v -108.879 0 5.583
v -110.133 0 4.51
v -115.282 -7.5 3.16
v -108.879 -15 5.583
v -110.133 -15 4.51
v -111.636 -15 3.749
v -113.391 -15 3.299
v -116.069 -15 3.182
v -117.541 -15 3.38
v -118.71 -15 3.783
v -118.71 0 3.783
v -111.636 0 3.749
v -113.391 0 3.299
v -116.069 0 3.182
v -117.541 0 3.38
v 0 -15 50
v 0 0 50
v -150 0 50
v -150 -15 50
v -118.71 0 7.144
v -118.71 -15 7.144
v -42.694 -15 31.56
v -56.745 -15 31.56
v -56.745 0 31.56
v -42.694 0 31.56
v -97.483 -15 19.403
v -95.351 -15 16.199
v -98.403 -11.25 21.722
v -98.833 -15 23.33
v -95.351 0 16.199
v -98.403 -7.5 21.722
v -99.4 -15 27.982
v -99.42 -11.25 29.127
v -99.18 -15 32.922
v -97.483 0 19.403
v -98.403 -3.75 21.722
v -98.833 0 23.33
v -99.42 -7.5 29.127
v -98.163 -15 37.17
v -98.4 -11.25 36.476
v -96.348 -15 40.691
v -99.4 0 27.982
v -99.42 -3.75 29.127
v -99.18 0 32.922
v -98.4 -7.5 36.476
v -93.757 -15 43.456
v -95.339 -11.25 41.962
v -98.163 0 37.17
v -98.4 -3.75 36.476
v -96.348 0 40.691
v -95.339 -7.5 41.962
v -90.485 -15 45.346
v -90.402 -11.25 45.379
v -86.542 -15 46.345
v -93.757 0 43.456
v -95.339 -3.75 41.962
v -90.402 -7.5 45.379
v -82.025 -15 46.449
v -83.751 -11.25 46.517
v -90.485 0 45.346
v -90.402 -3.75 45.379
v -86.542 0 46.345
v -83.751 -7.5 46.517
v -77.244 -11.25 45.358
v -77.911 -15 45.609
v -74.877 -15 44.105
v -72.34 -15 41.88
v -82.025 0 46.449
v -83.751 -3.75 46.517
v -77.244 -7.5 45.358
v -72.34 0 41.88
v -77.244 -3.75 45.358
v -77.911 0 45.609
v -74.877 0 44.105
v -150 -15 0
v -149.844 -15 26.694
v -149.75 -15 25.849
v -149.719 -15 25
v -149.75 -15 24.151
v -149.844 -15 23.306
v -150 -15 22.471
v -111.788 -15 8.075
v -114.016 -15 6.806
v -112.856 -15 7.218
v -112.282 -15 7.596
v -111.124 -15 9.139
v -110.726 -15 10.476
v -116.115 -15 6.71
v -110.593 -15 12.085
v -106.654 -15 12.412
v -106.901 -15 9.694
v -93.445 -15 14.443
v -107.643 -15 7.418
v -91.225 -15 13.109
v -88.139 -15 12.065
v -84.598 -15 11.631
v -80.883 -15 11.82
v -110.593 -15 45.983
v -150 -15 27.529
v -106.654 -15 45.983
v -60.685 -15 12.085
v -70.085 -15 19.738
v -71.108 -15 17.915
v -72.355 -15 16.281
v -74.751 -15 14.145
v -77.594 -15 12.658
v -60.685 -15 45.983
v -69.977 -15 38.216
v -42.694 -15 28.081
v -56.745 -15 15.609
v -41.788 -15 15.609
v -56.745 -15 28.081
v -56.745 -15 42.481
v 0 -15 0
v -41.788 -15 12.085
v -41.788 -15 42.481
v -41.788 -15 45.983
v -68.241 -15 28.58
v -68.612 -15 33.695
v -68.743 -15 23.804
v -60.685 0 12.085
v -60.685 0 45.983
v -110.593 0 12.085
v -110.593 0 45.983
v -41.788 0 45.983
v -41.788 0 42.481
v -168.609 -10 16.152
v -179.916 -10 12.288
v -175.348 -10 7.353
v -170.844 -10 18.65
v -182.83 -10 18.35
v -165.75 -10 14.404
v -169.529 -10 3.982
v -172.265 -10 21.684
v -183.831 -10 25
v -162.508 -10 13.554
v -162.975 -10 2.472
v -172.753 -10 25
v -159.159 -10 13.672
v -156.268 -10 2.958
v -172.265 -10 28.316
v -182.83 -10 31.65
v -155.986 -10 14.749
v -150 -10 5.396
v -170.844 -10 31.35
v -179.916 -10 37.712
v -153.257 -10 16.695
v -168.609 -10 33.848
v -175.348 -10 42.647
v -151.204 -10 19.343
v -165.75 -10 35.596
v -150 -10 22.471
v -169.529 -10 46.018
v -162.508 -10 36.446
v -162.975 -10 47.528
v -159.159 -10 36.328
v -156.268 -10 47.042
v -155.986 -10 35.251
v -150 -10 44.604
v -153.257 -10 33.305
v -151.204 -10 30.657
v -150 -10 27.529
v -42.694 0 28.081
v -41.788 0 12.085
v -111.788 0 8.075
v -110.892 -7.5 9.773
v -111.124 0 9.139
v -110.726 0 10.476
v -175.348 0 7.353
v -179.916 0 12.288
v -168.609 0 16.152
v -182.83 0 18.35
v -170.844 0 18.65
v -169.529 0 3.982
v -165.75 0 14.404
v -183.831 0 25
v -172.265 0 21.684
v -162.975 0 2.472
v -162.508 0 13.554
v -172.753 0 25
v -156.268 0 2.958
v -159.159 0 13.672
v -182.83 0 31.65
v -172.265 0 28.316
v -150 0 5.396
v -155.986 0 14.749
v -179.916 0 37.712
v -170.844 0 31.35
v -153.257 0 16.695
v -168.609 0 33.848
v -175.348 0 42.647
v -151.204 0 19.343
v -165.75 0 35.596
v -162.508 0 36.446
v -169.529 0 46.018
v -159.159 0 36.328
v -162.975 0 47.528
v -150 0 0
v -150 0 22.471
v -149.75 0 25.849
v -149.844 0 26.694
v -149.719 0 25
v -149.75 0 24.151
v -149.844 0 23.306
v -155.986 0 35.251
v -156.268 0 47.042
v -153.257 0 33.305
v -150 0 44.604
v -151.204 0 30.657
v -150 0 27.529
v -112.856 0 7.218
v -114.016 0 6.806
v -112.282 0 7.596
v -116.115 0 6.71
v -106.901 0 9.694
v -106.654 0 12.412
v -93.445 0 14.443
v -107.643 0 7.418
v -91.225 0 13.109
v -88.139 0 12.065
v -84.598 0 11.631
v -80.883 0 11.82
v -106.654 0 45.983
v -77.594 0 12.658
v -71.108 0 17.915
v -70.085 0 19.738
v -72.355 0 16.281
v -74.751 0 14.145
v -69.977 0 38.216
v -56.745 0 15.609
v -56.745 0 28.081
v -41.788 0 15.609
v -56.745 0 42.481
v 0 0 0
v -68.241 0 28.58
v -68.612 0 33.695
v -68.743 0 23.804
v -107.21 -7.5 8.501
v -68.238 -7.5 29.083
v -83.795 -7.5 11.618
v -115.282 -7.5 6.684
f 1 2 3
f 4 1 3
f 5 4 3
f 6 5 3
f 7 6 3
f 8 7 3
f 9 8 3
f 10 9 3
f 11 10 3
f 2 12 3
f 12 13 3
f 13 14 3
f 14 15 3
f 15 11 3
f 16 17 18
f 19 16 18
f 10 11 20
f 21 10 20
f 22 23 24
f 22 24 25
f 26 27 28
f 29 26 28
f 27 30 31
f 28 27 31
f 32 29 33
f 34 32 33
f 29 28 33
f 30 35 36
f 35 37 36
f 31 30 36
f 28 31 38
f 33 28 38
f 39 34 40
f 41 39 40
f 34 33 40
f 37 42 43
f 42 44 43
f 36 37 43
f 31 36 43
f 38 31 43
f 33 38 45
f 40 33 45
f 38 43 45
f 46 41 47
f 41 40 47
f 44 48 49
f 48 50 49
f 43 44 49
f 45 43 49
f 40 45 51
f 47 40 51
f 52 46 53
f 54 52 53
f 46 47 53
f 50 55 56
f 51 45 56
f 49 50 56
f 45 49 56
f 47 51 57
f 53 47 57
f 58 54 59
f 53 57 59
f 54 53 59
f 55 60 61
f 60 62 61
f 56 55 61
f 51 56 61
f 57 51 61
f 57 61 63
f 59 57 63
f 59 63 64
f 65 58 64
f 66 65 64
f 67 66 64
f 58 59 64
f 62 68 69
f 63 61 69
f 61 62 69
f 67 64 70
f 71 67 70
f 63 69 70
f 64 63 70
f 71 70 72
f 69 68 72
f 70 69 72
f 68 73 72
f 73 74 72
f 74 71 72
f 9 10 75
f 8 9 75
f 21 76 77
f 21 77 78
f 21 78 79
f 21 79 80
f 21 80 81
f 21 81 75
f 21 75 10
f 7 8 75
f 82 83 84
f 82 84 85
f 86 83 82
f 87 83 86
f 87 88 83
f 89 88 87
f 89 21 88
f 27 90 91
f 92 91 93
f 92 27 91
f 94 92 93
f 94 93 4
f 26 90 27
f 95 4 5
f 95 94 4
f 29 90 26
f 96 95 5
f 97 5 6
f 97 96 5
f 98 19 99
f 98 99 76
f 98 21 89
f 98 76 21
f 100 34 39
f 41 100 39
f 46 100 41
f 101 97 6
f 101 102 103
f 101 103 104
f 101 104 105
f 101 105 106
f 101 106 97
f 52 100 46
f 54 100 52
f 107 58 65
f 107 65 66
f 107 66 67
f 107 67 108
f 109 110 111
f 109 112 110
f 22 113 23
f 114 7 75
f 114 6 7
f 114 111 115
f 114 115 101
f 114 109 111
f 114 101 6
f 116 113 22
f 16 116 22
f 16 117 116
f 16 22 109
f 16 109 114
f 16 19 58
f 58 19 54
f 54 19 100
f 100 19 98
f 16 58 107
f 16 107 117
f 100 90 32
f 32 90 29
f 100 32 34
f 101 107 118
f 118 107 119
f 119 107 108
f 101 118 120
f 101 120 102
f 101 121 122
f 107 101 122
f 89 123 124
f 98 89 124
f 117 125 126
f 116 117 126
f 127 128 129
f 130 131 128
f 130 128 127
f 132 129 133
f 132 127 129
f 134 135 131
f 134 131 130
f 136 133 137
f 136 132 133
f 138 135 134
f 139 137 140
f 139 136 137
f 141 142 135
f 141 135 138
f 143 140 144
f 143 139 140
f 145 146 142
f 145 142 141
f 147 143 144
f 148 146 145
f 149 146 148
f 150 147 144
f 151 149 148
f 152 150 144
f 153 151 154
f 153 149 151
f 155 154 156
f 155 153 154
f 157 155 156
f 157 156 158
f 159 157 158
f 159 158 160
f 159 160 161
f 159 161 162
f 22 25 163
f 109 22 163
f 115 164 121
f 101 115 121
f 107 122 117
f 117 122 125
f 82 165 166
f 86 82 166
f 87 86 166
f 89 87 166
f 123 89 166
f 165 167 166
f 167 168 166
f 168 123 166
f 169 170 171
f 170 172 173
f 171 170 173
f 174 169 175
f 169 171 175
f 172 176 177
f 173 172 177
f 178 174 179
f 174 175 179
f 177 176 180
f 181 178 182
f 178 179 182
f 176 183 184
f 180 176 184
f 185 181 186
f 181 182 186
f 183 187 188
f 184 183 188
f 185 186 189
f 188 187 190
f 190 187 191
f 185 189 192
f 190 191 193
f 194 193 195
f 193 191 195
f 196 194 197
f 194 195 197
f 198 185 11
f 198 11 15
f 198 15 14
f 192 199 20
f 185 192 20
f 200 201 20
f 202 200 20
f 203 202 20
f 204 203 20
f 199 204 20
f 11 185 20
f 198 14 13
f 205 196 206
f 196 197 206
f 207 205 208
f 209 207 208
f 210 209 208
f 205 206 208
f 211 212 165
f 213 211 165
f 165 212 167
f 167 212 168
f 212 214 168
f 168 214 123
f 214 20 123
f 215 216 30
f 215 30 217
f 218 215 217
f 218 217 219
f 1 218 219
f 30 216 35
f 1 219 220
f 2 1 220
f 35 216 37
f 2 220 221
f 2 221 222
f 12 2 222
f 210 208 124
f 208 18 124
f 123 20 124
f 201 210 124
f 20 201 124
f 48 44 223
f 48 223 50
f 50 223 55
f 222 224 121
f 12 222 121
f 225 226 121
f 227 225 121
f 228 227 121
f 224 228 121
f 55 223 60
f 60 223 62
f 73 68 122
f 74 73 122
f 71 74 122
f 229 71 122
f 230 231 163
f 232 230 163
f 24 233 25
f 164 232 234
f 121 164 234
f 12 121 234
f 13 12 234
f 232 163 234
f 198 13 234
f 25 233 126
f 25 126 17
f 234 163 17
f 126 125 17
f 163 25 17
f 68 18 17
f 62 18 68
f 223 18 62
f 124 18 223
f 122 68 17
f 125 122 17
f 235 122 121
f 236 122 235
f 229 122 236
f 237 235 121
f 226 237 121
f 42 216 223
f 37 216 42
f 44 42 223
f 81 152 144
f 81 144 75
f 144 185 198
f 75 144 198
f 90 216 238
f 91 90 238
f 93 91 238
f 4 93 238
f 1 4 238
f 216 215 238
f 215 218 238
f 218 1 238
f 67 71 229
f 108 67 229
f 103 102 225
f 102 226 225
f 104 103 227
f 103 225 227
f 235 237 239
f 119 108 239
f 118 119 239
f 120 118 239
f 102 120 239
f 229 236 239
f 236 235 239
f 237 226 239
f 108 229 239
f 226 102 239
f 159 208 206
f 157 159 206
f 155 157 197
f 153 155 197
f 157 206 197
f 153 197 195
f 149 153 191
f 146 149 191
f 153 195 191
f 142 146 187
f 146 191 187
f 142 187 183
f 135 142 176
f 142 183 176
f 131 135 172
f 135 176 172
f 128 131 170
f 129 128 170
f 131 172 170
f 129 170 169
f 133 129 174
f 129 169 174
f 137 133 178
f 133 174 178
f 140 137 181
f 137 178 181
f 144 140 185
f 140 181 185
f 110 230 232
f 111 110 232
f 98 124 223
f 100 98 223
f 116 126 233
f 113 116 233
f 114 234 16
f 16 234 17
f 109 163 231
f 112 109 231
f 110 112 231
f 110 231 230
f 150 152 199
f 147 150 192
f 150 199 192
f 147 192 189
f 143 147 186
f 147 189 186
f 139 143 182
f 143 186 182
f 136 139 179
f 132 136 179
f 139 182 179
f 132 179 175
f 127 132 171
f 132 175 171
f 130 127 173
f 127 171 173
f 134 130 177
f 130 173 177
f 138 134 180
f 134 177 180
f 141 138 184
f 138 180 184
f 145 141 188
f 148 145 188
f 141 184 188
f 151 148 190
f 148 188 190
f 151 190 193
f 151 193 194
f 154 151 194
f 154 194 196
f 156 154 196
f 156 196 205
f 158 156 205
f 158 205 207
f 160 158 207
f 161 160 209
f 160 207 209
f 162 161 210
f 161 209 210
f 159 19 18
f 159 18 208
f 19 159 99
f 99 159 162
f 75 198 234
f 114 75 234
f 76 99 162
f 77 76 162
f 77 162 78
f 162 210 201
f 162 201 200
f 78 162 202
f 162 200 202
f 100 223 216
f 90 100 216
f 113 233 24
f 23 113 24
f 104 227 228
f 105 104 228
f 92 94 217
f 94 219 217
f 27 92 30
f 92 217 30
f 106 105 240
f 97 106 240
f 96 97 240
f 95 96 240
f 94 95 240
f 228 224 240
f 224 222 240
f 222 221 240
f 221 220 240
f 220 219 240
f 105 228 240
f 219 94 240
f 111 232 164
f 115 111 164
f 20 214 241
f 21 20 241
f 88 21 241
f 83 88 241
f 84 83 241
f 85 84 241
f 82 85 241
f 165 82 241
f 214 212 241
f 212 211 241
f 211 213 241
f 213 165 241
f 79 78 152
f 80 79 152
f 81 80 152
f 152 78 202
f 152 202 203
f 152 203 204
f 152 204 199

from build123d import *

# Parameters (mm, degrees)
F1_DEPTH = 15
F2_DEPTH = 10


with BuildPart() as f1:
    # F0 (on Front) → F1 (new body)
    with BuildSketch(Plane.XZ):
        with BuildLine():
            Line((-150, 0), (0, 0))
            Line((0, 0), (0, 50))
            Line((0, 50), (-150, 50))
            Line((-150, 50), (-150, 44.6036947758))
            Line((-150, 44.6036947758), (-150, 27.5289733242))
            ThreePointArc((-150, 27.5289733242), (-149.78939418, 26.2722736231), (-149.7189046187, 25))
            ThreePointArc((-149.7189046187, 25), (-149.78939418, 23.7277263769), (-150, 22.4710266758))
            Line((-150, 22.4710266758), (-150, 5.3963052242))
            Line((-150, 5.3963052242), (-150, 0))
        make_face()
        with BuildLine():
            add(Edge.make_bspline(
                [(-108.8792543819, 5.5825479955), (-111.1049800612, 3.1602165479), (-115.2819252527, 3.1602165479)],
                knots=[0, 0, 0, 1, 1, 1], degree=2))
            add(Edge.make_bspline(
                [(-115.2819252527, 3.1602165479), (-117.4557173328, 3.1602165479), (-118.7095427989, 3.7834197381)],
                knots=[0, 0, 0, 1, 1, 1], degree=2))
            Line((-118.7095427989, 3.7834197381), (-118.7095427989, 7.1442655139))
            add(Edge.make_bspline(
                [(-118.7095427989, 7.1442655139), (-117.0625057962, 6.6842822068), (-115.2819252527, 6.6842822068)],
                knots=[0, 0, 0, 1, 1, 1], degree=2))
            add(Edge.make_bspline(
                [(-115.2819252527, 6.6842822068), (-112.9820087174, 6.6842822068), (-111.7875359362, 8.0753607564)],
                knots=[0, 0, 0, 1, 1, 1], degree=2))
            add(Edge.make_bspline(
                [(-111.7875359362, 8.0753607564), (-110.593063155, 9.4664393059), (-110.593063155, 12.0853765219)],
                knots=[0, 0, 0, 1, 1, 1], degree=2))
            Line((-110.593063155, 12.0853765219), (-110.593063155, 45.9831786178))
            Line((-110.593063155, 45.9831786178), (-106.6535287026, 45.9831786178))
            Line((-106.6535287026, 45.9831786178), (-106.6535287026, 12.4118162882))
            add(Edge.make_bspline(
                [(-106.6535287026, 12.4118162882), (-106.6535287026, 8.0048794432), (-108.8792543819, 5.5825479955)],
                knots=[0, 0, 0, 1, 1, 1], degree=2))
        make_face(mode=Mode.SUBTRACT)
        with BuildLine():
            add(Edge.make_bspline(
                [(-72.3402578132, 41.8804242823), (-68.2375034777, 37.2434957837), (-68.2375034777, 29.0825016263)],
                knots=[0, 0, 0, 1, 1, 1], degree=2))
            add(Edge.make_bspline(
                [(-68.2375034777, 29.0825016263), (-68.2375034777, 20.9437647256), (-72.3550959844, 16.2808694274)],
                knots=[0, 0, 0, 1, 1, 1], degree=2))
            add(Edge.make_bspline(
                [(-72.3550959844, 16.2808694274), (-76.4726884911, 11.6179741293), (-83.7953259761, 11.6179741293)],
                knots=[0, 0, 0, 1, 1, 1], degree=2))
            add(Edge.make_bspline(
                [(-83.7953259761, 11.6179741293), (-91.2811833442, 11.6179741293), (-95.3505517945, 16.1992594859)],
                knots=[0, 0, 0, 1, 1, 1], degree=2))
            add(Edge.make_bspline(
                [(-95.3505517945, 16.1992594859), (-99.4199202448, 20.7805448424), (-99.4199202448, 29.1270161398)],
                knots=[0, 0, 0, 1, 1, 1], degree=2))
            add(Edge.make_bspline(
                [(-99.4199202448, 29.1270161398), (-99.4199202448, 37.4067156669), (-95.3394231661, 41.9620342239)],
                knots=[0, 0, 0, 1, 1, 1], degree=2))
            add(Edge.make_bspline(
                [(-95.3394231661, 41.9620342239), (-91.2589260874, 46.5173527809), (-83.7508114625, 46.5173527809)],
                knots=[0, 0, 0, 1, 1, 1], degree=2))
            add(Edge.make_bspline(
                [(-83.7508114625, 46.5173527809), (-76.4430121488, 46.5173527809), (-72.3402578132, 41.8804242823)],
                knots=[0, 0, 0, 1, 1, 1], degree=2))
        make_face(mode=Mode.SUBTRACT)
        Polygon((-41.7884633219, 15.6094421808), (-41.7884633219, 12.0853765219), (-60.6848743392, 12.0853765219), (-60.6848743392, 45.9831786178), (-41.7884633219, 45.9831786178), (-41.7884633219, 42.4813702157), (-56.7453398869, 42.4813702157), (-56.7453398869, 31.5604762159), (-42.6935917648, 31.5604762159), (-42.6935917648, 28.0809250706), (-56.7453398869, 28.0809250706), (-56.7453398869, 15.6094421808), align=None, mode=Mode.SUBTRACT)
    extrude(amount=F1_DEPTH)

    # F0 (on Front) → F2 (join)
    with BuildSketch(Plane.XZ):
        with BuildLine():
            ThreePointArc((-150, 44.6036947758), (-183.8311862448, 25), (-150, 5.3963052242))
            Line((-150, 5.3963052242), (-150, 22.4710266758))
            ThreePointArc((-150, 22.4710266758), (-172.7527967389, 25), (-150, 27.5289733242))
            Line((-150, 27.5289733242), (-150, 44.6036947758))
        make_face()
    extrude(amount=F2_DEPTH)


solid = f1.part
